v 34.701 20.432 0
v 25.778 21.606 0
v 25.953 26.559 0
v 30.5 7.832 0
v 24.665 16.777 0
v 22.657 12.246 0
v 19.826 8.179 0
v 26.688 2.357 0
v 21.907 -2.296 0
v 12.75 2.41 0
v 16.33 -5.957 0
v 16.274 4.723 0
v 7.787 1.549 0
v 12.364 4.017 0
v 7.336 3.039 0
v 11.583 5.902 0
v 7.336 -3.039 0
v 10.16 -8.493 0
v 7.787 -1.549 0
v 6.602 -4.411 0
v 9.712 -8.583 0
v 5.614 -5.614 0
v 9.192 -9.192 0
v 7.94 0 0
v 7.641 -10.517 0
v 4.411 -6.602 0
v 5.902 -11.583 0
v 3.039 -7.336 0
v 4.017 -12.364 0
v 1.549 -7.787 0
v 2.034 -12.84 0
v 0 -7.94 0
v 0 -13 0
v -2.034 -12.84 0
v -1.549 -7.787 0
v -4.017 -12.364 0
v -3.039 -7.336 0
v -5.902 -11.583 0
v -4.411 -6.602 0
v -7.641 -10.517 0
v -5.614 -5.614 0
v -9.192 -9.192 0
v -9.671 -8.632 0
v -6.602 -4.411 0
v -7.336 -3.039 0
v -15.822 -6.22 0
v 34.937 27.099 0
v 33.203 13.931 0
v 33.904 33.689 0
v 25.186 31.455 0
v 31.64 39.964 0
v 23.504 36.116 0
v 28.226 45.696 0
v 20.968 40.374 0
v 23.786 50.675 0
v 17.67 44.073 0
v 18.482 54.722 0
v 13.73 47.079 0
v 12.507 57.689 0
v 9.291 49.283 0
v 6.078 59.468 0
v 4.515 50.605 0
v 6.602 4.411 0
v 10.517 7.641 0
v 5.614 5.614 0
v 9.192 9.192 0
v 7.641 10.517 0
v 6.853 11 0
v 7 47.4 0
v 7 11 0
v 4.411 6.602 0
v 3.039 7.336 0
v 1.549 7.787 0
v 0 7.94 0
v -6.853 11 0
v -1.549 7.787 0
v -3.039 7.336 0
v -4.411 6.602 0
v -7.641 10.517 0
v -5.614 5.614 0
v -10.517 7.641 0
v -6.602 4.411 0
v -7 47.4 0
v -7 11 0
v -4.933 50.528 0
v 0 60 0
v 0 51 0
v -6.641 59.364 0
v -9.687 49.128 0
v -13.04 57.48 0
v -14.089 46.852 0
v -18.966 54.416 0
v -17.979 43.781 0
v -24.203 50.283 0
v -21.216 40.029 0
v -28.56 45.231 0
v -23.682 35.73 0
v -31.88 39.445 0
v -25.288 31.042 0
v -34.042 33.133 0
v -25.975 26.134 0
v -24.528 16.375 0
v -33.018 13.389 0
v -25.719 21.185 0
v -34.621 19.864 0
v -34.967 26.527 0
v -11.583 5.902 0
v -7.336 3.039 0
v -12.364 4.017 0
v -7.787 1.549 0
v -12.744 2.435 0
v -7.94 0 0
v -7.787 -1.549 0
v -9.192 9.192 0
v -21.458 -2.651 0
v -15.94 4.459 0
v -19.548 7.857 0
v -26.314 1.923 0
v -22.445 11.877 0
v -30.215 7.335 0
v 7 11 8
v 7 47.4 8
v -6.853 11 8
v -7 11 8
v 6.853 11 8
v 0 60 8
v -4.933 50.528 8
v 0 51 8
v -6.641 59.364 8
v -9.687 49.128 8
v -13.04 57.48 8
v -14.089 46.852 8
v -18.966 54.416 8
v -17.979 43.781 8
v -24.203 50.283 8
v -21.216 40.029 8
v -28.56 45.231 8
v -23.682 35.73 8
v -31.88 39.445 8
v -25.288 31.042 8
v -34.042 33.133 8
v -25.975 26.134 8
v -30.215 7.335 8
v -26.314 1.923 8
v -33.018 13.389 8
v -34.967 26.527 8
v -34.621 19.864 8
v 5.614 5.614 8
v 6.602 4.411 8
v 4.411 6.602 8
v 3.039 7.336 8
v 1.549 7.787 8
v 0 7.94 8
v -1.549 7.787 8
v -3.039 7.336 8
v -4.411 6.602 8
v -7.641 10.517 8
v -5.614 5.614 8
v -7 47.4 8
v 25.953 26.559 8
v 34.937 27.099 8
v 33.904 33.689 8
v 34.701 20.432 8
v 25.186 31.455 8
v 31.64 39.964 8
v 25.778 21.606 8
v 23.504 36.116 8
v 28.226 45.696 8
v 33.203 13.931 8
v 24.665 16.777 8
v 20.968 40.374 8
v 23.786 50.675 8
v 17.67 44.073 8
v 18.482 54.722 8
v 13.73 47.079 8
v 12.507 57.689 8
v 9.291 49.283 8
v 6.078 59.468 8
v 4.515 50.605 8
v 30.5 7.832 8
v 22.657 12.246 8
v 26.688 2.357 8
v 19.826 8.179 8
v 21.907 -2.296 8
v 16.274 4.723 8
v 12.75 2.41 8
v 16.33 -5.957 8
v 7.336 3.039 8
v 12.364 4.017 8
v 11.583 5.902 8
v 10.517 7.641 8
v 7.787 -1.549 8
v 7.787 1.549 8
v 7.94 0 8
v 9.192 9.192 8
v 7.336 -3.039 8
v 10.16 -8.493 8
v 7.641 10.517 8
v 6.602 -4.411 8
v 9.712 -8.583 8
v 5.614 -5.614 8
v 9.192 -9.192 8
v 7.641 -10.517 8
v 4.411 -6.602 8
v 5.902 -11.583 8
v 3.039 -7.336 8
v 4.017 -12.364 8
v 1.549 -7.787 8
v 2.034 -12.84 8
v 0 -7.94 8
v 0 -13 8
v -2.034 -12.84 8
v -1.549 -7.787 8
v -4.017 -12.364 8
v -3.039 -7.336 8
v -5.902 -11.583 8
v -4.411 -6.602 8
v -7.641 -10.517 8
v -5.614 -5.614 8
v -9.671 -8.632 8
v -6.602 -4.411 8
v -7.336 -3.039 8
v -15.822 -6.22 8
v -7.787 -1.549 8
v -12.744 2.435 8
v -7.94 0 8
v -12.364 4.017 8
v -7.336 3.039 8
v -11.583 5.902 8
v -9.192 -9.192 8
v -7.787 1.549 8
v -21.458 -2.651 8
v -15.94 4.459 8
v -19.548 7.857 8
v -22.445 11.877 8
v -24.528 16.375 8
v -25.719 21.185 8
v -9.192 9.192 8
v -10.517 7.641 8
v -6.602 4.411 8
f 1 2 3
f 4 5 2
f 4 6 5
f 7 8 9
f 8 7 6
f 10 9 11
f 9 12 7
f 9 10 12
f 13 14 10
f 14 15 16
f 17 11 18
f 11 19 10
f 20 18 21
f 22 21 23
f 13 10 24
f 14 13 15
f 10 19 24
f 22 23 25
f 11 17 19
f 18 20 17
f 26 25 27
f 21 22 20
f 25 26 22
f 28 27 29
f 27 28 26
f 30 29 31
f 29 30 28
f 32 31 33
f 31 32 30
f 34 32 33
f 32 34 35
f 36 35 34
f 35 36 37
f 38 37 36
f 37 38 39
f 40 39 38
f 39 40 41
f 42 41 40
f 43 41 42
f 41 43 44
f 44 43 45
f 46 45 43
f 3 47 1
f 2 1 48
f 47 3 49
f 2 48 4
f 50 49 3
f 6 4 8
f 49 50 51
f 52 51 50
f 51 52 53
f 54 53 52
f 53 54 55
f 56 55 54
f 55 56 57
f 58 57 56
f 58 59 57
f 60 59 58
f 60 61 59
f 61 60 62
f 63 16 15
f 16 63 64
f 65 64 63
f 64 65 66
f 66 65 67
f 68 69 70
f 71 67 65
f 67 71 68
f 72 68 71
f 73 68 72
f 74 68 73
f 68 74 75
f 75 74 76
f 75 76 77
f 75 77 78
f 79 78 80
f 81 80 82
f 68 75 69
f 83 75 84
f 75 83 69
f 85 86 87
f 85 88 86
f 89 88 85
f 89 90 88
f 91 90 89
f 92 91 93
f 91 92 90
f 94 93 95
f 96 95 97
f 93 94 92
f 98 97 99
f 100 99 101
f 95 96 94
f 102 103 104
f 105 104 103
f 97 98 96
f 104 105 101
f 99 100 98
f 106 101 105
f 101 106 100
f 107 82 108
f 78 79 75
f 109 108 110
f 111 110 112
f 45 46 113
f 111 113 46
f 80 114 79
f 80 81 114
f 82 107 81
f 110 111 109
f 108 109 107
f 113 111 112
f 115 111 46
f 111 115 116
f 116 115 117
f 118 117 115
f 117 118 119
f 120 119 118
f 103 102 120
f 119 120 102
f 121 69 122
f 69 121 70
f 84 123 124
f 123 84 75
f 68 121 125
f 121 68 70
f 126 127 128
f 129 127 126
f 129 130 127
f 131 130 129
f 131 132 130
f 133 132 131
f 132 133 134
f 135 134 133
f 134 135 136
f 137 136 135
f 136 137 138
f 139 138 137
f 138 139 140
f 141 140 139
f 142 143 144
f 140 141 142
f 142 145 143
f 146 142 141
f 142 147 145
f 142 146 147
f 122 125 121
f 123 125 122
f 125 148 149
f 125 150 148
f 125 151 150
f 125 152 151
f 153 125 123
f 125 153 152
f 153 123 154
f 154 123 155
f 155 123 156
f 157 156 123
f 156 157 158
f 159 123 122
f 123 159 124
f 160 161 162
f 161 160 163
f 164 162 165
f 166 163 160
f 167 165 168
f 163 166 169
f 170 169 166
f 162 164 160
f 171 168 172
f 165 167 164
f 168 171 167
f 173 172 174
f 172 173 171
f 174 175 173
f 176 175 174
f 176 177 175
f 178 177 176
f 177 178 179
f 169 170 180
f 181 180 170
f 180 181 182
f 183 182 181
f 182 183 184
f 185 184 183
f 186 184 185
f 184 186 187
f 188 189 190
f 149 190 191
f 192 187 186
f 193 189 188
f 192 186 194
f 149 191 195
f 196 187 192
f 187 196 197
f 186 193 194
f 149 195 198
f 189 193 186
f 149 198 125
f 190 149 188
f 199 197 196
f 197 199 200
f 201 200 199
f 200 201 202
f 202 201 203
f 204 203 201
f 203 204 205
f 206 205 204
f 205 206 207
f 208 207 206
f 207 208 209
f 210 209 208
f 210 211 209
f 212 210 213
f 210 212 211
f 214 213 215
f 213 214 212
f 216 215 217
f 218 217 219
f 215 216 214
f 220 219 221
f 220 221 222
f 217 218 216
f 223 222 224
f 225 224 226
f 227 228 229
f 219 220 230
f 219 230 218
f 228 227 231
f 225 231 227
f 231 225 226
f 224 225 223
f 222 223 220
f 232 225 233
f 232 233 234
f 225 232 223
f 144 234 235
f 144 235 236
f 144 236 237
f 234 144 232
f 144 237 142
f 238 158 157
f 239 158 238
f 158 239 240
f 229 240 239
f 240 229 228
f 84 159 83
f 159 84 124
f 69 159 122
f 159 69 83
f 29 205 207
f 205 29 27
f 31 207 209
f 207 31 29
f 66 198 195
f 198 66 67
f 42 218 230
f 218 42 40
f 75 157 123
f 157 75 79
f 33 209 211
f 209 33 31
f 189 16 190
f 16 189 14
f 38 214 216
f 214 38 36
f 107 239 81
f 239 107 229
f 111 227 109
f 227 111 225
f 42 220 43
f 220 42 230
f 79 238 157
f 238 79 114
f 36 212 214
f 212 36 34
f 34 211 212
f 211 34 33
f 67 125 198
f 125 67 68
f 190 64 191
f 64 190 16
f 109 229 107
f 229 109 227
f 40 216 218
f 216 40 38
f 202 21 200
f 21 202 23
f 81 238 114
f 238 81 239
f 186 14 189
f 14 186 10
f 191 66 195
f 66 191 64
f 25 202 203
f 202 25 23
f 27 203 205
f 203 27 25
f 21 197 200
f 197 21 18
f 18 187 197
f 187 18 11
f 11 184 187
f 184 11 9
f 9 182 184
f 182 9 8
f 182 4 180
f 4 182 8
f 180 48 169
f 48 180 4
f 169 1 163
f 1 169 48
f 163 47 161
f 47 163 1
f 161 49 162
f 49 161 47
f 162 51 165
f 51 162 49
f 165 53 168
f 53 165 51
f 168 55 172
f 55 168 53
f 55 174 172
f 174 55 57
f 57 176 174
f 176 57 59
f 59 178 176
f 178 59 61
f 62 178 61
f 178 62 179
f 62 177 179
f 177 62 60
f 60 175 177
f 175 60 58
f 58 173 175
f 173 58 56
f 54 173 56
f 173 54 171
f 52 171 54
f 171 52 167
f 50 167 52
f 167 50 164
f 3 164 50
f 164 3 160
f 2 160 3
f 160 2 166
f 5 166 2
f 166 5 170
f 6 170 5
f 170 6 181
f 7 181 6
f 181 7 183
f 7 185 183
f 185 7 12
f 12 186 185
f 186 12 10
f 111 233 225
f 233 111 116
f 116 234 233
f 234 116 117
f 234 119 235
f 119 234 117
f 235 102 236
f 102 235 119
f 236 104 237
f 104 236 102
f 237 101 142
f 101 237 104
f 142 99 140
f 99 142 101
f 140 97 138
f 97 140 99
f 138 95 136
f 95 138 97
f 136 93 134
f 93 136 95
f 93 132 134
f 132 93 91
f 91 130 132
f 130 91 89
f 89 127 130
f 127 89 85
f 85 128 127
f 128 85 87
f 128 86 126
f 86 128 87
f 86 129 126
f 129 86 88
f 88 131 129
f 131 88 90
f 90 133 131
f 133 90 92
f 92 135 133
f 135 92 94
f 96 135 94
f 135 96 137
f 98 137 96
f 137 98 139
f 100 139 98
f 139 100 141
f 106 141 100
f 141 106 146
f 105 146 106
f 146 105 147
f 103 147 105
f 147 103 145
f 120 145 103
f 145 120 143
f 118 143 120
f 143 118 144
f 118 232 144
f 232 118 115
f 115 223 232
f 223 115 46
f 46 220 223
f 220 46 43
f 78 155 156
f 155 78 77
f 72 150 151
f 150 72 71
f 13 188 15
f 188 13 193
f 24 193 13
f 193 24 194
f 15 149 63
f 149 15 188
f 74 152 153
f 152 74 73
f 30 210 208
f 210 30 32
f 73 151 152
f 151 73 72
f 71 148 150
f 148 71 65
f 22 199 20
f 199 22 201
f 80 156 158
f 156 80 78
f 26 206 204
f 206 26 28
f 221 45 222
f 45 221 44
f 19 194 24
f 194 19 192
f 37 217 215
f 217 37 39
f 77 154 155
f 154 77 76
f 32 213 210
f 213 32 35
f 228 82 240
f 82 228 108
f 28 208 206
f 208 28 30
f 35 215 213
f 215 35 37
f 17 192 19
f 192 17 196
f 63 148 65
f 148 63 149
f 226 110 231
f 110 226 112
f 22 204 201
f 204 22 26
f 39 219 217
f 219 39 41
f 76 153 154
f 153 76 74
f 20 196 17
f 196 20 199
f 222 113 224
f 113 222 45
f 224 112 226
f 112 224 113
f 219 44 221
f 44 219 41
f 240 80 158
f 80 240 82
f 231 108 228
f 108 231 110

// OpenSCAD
$fn = 32;

// ----------------------------------------------------------------------
// Hook: 50 mm shank into a 26 mm curl, 8 mm thick
// ----------------------------------------------------------------------

// --- parameters (mm) ---
shank_len = 50;           // shank length from the boss centre
shank_w = 14;             // shank width
boss_d = 26;              // boss diameter
bore_d = 15.88;           // boss bore
curl_in = 26;             // curl inner radius
curl_out = 35;            // curl outer radius
curl_sweep = 350;         // curl sweep angle
hook_t = 8;               // hook thickness

shank_profile = [[-7, 47.4], [7, 47.4], [7, 11], [-7, 11]];
boss_profile = [[13, 0], [12.84, 2.034], [12.364, 4.017], [11.583, 5.902], [10.517, 7.641], [9.192, 9.192], [7.641, 10.517], [5.902, 11.583], [4.017, 12.364], [2.034, 12.84], [0, 13], [-2.034, 12.84], [-4.017, 12.364], [-5.902, 11.583], [-7.641, 10.517], [-9.192, 9.192], [-10.517, 7.641], [-11.583, 5.902], [-12.364, 4.017], [-12.84, 2.034], [-13, 0], [-12.84, -2.034], [-12.364, -4.017], [-11.583, -5.902], [-10.517, -7.641], [-9.192, -9.192], [-7.641, -10.517], [-5.902, -11.583], [-4.017, -12.364], [-2.034, -12.84], [0, -13], [2.034, -12.84], [4.017, -12.364], [5.902, -11.583], [7.641, -10.517], [9.192, -9.192], [10.517, -7.641], [11.583, -5.902], [12.364, -4.017], [12.84, -2.034]];
curl_profile = [[0, 60], [-6.641, 59.364], [-13.04, 57.48], [-18.966, 54.416], [-24.203, 50.283], [-28.56, 45.231], [-31.88, 39.445], [-34.042, 33.133], [-34.967, 26.527], [-34.621, 19.864], [-33.018, 13.389], [-30.215, 7.335], [-26.314, 1.923], [-21.458, -2.651], [-15.822, -6.22], [-9.611, -8.655], [-3.05, -9.867], [3.621, -9.812], [10.16, -8.493], [16.33, -5.957], [21.907, -2.296], [26.688, 2.357], [30.5, 7.832], [33.203, 13.931], [34.701, 20.432], [34.937, 27.099], [33.904, 33.689], [31.64, 39.964], [28.226, 45.696], [23.786, 50.675], [18.482, 54.722], [12.507, 57.689], [6.078, 59.468], [4.515, 50.605], [9.291, 49.283], [13.73, 47.079], [17.67, 44.073], [20.968, 40.374], [23.504, 36.116], [25.186, 31.455], [25.953, 26.559], [25.778, 21.606], [24.665, 16.777], [22.657, 12.246], [19.826, 8.179], [16.274, 4.723], [12.131, 2.004], [7.547, 0.12], [2.69, -0.861], [-2.266, -0.901], [-7.139, -0.001], [-11.753, 1.808], [-15.94, 4.459], [-19.548, 7.857], [-22.445, 11.877], [-24.528, 16.375], [-25.719, 21.185], [-25.975, 26.134], [-25.288, 31.042], [-23.682, 35.73], [-21.216, 40.029], [-17.979, 43.781], [-14.089, 46.852], [-9.687, 49.128], [-4.933, 50.528], [0, 51]];

difference() {
  union() {
    /* three overlapping outlines: shank, boss and the smooth curl */
    linear_extrude(height = hook_t) polygon(shank_profile);
    linear_extrude(height = hook_t) polygon(boss_profile);
    linear_extrude(height = hook_t) polygon(curl_profile);
  }
  translate([0, 0, -2.5]) cylinder(h = hook_t + 5, d = bore_d);
}
